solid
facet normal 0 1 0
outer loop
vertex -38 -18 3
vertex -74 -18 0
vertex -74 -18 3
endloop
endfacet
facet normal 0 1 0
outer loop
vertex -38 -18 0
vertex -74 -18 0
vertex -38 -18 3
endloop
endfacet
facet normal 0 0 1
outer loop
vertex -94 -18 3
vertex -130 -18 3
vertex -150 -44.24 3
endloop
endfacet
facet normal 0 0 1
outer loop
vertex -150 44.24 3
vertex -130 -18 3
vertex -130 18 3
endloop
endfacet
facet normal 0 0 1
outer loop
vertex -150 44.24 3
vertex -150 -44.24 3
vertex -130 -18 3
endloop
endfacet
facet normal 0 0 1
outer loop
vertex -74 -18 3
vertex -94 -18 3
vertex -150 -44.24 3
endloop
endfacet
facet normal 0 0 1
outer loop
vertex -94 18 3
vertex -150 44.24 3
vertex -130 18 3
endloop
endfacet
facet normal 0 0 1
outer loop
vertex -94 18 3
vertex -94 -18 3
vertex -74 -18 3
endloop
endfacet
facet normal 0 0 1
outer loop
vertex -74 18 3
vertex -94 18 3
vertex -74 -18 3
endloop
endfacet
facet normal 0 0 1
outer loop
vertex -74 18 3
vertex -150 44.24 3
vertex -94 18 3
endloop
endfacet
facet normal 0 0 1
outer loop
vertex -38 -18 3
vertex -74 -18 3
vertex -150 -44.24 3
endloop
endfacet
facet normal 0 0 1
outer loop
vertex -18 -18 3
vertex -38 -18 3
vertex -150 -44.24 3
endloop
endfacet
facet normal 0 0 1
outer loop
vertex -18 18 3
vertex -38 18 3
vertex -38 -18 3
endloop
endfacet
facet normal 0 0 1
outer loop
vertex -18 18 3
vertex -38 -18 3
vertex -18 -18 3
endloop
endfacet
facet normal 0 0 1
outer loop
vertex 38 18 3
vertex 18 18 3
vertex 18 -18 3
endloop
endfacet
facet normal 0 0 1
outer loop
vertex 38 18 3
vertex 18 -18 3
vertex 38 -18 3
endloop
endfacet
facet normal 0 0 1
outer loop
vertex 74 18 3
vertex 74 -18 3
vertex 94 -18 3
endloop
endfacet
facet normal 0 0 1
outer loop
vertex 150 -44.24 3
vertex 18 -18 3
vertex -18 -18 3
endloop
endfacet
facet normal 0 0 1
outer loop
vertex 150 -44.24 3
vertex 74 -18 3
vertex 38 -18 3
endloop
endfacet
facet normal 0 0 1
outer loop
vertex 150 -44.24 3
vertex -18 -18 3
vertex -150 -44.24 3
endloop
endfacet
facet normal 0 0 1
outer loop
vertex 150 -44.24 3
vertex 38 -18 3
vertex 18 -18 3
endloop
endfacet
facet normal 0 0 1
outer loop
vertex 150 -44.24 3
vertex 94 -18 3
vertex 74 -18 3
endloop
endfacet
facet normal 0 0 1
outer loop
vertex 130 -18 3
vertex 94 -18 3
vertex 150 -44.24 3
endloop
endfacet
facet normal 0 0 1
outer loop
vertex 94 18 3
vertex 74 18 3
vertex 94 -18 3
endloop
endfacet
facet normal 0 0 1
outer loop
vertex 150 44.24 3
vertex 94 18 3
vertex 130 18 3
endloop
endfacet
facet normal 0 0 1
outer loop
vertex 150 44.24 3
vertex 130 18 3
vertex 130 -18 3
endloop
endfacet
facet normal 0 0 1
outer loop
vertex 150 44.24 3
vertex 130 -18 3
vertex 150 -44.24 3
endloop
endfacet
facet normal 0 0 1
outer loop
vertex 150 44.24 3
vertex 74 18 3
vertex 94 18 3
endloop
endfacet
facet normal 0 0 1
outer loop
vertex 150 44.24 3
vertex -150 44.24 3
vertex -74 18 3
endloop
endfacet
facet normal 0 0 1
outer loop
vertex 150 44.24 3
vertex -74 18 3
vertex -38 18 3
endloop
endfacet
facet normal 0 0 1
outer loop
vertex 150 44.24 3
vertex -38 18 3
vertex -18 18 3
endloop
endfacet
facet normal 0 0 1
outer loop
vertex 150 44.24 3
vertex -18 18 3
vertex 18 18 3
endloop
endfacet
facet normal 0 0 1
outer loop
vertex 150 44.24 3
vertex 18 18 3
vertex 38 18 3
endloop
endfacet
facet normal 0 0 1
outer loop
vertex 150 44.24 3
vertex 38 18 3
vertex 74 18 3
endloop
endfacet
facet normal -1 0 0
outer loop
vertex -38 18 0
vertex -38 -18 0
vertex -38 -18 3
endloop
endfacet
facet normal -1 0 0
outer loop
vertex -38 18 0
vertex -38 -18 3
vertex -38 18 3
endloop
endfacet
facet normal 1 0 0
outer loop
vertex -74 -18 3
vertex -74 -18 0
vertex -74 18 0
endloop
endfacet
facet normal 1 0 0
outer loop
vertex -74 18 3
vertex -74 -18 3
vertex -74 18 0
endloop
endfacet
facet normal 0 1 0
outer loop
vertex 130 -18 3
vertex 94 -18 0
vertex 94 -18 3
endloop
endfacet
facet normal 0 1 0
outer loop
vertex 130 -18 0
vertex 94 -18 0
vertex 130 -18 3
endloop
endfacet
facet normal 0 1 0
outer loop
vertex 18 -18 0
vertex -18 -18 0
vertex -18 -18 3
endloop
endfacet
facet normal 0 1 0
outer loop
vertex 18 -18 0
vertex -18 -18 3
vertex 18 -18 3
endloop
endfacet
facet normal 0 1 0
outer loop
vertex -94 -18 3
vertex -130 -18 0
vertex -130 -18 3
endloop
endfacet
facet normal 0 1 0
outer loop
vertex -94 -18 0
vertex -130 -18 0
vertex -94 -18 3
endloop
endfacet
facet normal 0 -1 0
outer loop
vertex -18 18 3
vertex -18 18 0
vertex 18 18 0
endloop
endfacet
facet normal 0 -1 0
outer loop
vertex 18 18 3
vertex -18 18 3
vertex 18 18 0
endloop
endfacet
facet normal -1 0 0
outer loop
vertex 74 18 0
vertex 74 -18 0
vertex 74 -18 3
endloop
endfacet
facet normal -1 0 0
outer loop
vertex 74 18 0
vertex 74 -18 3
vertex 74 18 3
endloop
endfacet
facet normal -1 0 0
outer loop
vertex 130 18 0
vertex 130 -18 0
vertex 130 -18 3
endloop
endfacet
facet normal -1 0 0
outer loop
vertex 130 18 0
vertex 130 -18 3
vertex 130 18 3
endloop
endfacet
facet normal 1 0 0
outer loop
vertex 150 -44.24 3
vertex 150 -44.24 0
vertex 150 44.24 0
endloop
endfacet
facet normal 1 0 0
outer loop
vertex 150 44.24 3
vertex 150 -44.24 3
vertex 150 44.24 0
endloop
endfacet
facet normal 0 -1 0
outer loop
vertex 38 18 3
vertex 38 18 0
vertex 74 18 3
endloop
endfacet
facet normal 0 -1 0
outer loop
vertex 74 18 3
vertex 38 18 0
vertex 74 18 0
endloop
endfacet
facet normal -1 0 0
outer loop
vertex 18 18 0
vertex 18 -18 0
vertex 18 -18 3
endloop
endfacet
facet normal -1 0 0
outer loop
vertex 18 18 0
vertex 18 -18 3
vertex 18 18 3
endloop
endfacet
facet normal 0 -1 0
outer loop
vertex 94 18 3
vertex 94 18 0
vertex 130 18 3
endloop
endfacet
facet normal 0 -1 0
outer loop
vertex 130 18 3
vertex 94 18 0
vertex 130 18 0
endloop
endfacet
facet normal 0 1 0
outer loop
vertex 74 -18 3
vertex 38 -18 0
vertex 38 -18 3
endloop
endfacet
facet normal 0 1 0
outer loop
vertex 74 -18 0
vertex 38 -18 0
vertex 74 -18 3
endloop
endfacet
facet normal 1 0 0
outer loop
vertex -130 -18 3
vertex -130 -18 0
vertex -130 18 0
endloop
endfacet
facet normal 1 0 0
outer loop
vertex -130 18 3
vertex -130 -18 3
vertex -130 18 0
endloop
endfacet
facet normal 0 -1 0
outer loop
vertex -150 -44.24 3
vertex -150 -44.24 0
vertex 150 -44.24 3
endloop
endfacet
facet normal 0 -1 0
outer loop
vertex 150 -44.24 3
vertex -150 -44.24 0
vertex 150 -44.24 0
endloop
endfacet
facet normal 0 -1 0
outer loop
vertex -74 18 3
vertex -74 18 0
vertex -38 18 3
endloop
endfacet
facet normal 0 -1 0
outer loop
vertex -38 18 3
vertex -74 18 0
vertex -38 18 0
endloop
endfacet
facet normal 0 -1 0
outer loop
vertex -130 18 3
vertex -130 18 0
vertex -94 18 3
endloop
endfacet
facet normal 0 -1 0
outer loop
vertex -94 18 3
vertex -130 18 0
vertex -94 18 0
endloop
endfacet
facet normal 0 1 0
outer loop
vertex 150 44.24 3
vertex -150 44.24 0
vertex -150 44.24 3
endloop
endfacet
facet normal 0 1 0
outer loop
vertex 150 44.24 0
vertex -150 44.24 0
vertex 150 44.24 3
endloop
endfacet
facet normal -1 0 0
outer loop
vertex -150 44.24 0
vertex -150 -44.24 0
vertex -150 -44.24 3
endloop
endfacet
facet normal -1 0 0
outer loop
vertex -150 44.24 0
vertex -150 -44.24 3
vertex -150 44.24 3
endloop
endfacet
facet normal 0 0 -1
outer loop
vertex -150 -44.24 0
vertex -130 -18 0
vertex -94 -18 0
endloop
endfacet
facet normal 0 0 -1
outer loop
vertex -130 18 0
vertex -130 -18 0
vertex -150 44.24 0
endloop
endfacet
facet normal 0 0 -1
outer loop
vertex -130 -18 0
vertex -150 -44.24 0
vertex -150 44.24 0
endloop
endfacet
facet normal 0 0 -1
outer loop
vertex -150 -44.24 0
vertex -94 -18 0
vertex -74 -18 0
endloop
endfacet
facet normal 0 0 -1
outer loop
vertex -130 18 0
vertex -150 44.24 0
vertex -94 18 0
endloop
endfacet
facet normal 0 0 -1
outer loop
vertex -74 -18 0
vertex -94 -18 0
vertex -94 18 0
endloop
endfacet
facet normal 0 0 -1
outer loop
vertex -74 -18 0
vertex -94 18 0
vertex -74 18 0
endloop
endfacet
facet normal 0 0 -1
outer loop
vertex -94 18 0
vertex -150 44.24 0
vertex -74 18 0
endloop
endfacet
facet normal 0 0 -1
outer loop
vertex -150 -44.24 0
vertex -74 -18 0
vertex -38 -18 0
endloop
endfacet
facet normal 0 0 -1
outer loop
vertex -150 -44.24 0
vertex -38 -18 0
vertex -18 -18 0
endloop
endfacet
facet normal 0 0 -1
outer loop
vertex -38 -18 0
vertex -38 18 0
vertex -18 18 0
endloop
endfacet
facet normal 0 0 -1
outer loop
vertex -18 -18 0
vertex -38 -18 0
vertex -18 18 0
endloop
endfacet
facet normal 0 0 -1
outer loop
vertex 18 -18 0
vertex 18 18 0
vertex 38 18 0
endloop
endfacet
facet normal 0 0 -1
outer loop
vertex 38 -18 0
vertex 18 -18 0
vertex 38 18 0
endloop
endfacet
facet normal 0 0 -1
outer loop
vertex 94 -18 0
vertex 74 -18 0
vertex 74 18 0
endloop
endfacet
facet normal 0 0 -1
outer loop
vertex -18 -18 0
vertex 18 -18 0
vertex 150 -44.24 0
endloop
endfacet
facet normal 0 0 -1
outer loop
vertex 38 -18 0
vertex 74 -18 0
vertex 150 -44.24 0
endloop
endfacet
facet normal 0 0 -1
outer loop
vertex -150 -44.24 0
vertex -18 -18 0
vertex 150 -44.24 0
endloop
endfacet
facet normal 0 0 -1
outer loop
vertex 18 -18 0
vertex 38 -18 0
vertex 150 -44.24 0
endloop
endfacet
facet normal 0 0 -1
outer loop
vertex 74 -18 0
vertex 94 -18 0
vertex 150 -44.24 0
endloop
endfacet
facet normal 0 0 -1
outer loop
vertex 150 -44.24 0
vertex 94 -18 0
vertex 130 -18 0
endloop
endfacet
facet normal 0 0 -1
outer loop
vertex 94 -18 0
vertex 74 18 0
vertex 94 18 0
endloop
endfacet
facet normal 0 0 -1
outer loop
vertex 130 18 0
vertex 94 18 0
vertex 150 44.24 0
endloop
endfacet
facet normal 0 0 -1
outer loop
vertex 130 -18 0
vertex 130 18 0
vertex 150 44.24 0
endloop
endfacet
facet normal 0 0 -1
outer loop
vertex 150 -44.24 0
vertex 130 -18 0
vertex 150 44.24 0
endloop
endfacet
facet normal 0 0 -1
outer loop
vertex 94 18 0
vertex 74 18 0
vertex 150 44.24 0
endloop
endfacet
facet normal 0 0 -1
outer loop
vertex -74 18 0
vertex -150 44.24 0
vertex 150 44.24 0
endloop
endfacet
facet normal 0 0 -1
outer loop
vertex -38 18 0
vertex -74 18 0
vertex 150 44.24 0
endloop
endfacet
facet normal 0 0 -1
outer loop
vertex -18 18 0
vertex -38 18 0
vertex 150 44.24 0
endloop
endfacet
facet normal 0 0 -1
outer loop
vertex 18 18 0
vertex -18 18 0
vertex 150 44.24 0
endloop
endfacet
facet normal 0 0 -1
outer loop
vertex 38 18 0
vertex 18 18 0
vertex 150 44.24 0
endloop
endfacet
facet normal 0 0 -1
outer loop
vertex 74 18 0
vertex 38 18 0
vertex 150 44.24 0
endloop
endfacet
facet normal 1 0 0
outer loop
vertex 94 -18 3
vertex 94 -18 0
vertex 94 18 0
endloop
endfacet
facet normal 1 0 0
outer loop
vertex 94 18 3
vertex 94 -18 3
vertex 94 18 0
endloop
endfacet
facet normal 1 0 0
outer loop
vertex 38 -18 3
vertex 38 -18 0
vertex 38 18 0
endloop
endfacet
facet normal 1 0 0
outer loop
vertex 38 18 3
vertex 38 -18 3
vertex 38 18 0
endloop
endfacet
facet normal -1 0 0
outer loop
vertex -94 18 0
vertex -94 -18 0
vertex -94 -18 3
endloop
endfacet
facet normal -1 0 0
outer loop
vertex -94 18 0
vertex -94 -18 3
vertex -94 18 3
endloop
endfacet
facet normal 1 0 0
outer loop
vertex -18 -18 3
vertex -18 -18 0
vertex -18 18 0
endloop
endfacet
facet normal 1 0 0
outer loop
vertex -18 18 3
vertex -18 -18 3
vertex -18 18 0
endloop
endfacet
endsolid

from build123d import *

# Parameters (mm, degrees)
SKETCH1_W           = 300
SKETCH1_H           = 88.48
SKETCH1_W_2         = 36
SKETCH1_H_2         = 36
BOSS_EXTRUDE1_DEPTH = 3


with BuildPart() as part:
    # Sketch1 → Boss-Extrude1 (new body)
    with BuildSketch(Plane.XY):
        Rectangle(SKETCH1_W, SKETCH1_H)
        with Locations((-56, 0)):
            Rectangle(SKETCH1_W_2, SKETCH1_H_2, mode=Mode.SUBTRACT)
        with Locations((-112, 0)):
            Rectangle(SKETCH1_W_2, SKETCH1_H_2, mode=Mode.SUBTRACT)
        Rectangle(SKETCH1_W_2, SKETCH1_H_2, mode=Mode.SUBTRACT)
        with Locations((56, 0)):
            Rectangle(SKETCH1_W_2, SKETCH1_H_2, mode=Mode.SUBTRACT)
        with Locations((112, 0)):
            Rectangle(SKETCH1_W_2, SKETCH1_H_2, mode=Mode.SUBTRACT)
    extrude(amount=BOSS_EXTRUDE1_DEPTH)


solid = part.part
